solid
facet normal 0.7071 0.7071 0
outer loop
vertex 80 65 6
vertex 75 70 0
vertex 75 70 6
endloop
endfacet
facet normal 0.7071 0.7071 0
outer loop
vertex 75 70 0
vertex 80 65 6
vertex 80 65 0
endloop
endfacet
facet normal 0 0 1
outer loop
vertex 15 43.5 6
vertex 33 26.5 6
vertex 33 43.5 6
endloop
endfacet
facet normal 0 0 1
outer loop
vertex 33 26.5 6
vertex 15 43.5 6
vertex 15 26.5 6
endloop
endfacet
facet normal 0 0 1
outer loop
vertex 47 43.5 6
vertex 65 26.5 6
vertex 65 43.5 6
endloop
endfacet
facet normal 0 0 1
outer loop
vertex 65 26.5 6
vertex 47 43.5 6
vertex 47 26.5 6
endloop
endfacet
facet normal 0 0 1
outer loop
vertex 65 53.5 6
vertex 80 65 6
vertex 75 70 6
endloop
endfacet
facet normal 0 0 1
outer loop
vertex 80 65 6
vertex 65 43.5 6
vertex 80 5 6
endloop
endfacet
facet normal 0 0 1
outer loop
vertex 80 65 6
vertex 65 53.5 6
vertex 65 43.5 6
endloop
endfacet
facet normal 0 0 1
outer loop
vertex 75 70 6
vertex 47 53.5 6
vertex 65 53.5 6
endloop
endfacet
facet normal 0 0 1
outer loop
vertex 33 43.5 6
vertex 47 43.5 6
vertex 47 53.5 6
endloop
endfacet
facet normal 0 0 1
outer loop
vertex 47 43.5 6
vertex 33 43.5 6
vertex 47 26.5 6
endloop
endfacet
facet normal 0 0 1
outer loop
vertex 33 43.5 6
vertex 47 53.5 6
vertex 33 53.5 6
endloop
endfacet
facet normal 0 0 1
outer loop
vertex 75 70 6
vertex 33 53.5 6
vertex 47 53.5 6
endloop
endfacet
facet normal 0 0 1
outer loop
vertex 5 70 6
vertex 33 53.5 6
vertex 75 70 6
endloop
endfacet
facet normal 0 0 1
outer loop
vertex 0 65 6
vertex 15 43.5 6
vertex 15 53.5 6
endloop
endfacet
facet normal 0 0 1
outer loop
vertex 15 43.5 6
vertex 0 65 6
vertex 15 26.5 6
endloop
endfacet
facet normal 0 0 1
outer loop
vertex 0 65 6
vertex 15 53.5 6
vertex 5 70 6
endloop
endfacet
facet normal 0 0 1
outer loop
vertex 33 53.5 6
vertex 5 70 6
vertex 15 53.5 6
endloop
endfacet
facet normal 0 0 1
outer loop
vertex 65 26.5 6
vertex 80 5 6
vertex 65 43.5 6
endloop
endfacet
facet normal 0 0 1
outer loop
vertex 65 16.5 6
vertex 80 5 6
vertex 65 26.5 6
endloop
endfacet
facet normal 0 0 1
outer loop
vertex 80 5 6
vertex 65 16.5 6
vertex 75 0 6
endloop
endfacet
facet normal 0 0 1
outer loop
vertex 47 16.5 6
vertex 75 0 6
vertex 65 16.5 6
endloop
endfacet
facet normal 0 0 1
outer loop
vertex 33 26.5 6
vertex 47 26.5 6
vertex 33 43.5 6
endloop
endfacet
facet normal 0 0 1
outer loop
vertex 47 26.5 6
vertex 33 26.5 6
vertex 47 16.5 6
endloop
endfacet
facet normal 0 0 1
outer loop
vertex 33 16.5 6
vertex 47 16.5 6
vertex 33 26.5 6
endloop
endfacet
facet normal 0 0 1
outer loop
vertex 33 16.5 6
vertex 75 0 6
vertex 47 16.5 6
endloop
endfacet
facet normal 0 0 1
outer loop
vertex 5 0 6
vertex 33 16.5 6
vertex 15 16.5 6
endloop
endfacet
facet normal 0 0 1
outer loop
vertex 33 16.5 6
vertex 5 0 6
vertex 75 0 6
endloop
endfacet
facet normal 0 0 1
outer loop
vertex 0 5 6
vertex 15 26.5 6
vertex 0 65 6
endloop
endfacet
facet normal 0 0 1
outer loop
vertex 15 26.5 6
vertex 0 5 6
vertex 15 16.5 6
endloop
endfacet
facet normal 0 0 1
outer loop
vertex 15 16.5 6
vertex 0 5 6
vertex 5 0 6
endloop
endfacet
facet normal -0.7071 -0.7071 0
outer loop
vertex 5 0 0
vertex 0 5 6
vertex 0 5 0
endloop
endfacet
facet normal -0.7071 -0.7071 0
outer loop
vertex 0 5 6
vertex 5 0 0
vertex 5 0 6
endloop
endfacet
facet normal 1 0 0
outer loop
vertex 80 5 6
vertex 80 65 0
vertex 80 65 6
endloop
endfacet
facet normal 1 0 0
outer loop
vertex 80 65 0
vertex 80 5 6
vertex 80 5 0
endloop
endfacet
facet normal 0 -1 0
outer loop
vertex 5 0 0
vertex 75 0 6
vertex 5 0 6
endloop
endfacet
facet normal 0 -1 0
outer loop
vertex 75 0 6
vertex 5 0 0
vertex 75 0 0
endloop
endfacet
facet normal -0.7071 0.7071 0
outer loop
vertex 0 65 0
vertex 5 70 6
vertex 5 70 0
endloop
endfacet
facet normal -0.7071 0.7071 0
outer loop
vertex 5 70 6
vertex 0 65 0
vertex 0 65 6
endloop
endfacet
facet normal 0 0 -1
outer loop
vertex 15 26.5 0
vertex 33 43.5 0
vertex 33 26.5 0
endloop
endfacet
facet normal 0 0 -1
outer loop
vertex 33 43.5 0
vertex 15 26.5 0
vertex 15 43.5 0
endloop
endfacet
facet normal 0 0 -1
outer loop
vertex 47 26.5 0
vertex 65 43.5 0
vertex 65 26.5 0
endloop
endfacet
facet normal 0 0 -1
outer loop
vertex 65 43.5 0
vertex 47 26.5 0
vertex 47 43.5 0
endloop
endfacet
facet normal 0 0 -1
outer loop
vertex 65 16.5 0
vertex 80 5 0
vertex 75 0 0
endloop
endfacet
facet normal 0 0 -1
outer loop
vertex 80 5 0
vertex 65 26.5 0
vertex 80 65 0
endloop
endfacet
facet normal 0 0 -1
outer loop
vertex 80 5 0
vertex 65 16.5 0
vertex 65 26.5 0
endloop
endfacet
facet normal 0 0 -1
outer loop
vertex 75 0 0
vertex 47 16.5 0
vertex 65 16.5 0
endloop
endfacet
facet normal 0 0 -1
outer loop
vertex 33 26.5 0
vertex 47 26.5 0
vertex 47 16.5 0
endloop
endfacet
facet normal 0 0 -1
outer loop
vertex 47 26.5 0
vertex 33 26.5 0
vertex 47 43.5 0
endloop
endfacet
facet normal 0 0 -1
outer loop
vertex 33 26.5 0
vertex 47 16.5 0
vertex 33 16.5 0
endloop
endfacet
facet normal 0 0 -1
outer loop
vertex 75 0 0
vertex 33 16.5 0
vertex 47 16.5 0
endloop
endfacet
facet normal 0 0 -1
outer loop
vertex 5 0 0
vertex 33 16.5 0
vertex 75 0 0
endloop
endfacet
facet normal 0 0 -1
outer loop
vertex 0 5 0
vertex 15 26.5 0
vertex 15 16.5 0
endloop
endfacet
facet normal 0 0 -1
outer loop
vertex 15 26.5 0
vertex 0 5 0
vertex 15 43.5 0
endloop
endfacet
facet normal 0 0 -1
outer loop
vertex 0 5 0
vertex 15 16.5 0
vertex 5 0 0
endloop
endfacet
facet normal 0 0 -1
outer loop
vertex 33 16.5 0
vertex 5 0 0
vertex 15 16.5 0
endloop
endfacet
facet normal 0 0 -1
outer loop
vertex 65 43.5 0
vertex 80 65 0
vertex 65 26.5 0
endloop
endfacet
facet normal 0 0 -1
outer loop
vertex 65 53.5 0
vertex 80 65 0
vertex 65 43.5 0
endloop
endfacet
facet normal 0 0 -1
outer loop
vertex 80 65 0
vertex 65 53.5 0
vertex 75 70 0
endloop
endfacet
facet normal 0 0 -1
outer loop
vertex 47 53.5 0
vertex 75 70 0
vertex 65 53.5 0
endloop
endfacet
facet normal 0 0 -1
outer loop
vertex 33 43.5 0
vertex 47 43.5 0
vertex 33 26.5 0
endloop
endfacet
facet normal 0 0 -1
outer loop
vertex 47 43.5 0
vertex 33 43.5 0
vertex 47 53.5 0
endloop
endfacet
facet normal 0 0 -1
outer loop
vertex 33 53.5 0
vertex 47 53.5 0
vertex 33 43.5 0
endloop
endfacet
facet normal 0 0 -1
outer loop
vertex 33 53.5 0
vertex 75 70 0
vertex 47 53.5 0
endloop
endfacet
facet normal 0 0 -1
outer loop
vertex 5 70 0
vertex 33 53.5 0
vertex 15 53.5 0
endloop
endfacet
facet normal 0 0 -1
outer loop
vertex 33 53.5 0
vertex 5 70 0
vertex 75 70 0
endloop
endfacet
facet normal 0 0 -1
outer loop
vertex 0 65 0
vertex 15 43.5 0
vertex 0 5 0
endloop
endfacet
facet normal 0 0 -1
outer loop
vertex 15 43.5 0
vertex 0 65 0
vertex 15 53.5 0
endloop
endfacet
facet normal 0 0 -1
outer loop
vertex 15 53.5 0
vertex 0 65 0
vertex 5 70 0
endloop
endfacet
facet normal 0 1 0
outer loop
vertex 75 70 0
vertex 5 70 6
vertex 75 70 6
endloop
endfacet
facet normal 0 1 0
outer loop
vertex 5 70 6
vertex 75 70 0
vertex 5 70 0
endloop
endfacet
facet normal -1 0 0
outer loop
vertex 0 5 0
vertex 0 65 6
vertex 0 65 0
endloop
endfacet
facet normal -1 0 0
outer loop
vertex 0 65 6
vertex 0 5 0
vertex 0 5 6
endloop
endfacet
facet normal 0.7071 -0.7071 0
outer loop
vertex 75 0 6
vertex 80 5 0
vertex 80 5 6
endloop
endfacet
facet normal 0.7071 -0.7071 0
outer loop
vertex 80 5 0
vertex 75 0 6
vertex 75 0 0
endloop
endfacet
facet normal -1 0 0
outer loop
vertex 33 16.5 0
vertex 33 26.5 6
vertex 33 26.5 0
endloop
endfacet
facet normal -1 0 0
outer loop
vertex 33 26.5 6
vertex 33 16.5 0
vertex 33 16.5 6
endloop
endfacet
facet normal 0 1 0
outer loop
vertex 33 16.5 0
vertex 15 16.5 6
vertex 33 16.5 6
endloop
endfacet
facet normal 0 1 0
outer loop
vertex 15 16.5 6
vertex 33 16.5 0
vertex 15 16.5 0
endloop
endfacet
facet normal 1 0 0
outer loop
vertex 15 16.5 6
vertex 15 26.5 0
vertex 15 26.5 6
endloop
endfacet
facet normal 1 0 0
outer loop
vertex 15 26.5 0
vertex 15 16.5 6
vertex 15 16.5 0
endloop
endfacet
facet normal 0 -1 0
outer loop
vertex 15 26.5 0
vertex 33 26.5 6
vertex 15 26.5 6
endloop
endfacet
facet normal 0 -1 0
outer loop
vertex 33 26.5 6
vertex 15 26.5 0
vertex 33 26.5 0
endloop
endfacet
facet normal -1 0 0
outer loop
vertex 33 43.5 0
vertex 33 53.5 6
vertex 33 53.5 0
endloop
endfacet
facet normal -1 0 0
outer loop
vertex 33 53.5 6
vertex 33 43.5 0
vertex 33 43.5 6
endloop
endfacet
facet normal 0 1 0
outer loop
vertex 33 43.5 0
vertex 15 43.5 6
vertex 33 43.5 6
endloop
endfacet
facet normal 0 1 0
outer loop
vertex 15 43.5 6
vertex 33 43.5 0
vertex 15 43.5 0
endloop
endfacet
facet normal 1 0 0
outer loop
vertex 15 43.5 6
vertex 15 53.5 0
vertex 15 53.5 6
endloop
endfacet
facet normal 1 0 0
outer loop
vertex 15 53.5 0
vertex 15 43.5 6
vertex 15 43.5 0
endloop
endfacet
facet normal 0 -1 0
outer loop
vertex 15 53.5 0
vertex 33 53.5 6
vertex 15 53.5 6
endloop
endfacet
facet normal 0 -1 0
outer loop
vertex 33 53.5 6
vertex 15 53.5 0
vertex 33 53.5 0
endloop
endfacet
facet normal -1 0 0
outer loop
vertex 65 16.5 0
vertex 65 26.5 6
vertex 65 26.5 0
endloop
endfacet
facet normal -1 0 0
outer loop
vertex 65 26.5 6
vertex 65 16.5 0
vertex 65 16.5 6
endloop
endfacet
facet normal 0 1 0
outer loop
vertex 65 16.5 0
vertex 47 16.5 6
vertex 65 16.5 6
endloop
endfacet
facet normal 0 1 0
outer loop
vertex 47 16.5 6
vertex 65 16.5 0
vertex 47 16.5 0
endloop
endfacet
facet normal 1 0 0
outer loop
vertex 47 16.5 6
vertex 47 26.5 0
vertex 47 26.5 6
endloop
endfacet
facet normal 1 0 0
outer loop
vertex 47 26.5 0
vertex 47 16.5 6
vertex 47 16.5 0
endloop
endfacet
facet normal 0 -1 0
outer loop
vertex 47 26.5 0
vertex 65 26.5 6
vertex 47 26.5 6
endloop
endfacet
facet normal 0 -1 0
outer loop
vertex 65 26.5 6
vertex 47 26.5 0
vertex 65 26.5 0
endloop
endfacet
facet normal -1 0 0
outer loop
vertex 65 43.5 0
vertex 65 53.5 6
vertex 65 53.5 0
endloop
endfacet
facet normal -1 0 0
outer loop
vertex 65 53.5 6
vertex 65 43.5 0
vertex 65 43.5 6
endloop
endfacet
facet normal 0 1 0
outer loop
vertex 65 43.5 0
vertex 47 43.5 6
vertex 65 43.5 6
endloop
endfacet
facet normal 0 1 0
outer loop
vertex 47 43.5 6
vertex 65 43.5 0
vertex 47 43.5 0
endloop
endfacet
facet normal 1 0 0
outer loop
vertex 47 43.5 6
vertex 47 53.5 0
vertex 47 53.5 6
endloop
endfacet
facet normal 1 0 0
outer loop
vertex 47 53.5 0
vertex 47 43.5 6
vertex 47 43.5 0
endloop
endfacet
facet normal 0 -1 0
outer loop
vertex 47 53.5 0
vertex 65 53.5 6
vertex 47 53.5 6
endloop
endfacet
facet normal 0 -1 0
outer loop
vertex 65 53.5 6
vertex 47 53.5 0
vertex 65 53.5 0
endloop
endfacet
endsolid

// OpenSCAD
$fn = 32;

// ----------------------------------------------------------------------
// Windowed plate: 4 voids, 80 x 70 x 6 mm
// ----------------------------------------------------------------------

// --- parameters (mm) ---
plate_l = 80;             // plate length, X
plate_w = 70;             // plate width, Y
plate_t = 6;              // plate thickness, Z
edge_margin = 8;          // wall from the plate edge to any window
win_l = 18;               // pocket length
win_w = 10;               // pocket width
pitch_x = 32;             // grid pitch along X
pitch_y = 27;             // grid pitch along Y
depth_1 = 6;              // depth of void 1 (full thickness = through)
depth_2 = 6;              // depth of void 2 (full thickness = through)
depth_3 = 6;              // depth of void 3 (full thickness = through)
depth_4 = 6;              // depth of void 4 (full thickness = through)
corner_c = 5;             // corner chamfer of the plate

profile = [[5, 0], [75, 0], [80, 5], [80, 65], [75, 70], [5, 70], [0, 65], [0, 5]];  // primary outline, 8 points, counter clockwise
void_1 = [[15, 16.5], [33, 16.5], [33, 26.5], [15, 26.5]];  // pocket at grid node 0,0, 4 points
void_2 = [[15, 43.5], [33, 43.5], [33, 53.5], [15, 53.5]];  // pocket at grid node 0,1, 4 points
void_3 = [[47, 16.5], [65, 16.5], [65, 26.5], [47, 26.5]];  // pocket at grid node 1,0, 4 points
void_4 = [[47, 43.5], [65, 43.5], [65, 53.5], [47, 53.5]];  // pocket at grid node 1,1, 4 points

// --- the one profile operation ---
difference() {
  linear_extrude(height = plate_t) polygon(points = profile);
  translate([0, 0, -1])
    linear_extrude(height = plate_t + 2) polygon(points = void_1);
  translate([0, 0, -1])
    linear_extrude(height = plate_t + 2) polygon(points = void_2);
  translate([0, 0, -1])
    linear_extrude(height = plate_t + 2) polygon(points = void_3);
  translate([0, 0, -1])
    linear_extrude(height = plate_t + 2) polygon(points = void_4);
}
